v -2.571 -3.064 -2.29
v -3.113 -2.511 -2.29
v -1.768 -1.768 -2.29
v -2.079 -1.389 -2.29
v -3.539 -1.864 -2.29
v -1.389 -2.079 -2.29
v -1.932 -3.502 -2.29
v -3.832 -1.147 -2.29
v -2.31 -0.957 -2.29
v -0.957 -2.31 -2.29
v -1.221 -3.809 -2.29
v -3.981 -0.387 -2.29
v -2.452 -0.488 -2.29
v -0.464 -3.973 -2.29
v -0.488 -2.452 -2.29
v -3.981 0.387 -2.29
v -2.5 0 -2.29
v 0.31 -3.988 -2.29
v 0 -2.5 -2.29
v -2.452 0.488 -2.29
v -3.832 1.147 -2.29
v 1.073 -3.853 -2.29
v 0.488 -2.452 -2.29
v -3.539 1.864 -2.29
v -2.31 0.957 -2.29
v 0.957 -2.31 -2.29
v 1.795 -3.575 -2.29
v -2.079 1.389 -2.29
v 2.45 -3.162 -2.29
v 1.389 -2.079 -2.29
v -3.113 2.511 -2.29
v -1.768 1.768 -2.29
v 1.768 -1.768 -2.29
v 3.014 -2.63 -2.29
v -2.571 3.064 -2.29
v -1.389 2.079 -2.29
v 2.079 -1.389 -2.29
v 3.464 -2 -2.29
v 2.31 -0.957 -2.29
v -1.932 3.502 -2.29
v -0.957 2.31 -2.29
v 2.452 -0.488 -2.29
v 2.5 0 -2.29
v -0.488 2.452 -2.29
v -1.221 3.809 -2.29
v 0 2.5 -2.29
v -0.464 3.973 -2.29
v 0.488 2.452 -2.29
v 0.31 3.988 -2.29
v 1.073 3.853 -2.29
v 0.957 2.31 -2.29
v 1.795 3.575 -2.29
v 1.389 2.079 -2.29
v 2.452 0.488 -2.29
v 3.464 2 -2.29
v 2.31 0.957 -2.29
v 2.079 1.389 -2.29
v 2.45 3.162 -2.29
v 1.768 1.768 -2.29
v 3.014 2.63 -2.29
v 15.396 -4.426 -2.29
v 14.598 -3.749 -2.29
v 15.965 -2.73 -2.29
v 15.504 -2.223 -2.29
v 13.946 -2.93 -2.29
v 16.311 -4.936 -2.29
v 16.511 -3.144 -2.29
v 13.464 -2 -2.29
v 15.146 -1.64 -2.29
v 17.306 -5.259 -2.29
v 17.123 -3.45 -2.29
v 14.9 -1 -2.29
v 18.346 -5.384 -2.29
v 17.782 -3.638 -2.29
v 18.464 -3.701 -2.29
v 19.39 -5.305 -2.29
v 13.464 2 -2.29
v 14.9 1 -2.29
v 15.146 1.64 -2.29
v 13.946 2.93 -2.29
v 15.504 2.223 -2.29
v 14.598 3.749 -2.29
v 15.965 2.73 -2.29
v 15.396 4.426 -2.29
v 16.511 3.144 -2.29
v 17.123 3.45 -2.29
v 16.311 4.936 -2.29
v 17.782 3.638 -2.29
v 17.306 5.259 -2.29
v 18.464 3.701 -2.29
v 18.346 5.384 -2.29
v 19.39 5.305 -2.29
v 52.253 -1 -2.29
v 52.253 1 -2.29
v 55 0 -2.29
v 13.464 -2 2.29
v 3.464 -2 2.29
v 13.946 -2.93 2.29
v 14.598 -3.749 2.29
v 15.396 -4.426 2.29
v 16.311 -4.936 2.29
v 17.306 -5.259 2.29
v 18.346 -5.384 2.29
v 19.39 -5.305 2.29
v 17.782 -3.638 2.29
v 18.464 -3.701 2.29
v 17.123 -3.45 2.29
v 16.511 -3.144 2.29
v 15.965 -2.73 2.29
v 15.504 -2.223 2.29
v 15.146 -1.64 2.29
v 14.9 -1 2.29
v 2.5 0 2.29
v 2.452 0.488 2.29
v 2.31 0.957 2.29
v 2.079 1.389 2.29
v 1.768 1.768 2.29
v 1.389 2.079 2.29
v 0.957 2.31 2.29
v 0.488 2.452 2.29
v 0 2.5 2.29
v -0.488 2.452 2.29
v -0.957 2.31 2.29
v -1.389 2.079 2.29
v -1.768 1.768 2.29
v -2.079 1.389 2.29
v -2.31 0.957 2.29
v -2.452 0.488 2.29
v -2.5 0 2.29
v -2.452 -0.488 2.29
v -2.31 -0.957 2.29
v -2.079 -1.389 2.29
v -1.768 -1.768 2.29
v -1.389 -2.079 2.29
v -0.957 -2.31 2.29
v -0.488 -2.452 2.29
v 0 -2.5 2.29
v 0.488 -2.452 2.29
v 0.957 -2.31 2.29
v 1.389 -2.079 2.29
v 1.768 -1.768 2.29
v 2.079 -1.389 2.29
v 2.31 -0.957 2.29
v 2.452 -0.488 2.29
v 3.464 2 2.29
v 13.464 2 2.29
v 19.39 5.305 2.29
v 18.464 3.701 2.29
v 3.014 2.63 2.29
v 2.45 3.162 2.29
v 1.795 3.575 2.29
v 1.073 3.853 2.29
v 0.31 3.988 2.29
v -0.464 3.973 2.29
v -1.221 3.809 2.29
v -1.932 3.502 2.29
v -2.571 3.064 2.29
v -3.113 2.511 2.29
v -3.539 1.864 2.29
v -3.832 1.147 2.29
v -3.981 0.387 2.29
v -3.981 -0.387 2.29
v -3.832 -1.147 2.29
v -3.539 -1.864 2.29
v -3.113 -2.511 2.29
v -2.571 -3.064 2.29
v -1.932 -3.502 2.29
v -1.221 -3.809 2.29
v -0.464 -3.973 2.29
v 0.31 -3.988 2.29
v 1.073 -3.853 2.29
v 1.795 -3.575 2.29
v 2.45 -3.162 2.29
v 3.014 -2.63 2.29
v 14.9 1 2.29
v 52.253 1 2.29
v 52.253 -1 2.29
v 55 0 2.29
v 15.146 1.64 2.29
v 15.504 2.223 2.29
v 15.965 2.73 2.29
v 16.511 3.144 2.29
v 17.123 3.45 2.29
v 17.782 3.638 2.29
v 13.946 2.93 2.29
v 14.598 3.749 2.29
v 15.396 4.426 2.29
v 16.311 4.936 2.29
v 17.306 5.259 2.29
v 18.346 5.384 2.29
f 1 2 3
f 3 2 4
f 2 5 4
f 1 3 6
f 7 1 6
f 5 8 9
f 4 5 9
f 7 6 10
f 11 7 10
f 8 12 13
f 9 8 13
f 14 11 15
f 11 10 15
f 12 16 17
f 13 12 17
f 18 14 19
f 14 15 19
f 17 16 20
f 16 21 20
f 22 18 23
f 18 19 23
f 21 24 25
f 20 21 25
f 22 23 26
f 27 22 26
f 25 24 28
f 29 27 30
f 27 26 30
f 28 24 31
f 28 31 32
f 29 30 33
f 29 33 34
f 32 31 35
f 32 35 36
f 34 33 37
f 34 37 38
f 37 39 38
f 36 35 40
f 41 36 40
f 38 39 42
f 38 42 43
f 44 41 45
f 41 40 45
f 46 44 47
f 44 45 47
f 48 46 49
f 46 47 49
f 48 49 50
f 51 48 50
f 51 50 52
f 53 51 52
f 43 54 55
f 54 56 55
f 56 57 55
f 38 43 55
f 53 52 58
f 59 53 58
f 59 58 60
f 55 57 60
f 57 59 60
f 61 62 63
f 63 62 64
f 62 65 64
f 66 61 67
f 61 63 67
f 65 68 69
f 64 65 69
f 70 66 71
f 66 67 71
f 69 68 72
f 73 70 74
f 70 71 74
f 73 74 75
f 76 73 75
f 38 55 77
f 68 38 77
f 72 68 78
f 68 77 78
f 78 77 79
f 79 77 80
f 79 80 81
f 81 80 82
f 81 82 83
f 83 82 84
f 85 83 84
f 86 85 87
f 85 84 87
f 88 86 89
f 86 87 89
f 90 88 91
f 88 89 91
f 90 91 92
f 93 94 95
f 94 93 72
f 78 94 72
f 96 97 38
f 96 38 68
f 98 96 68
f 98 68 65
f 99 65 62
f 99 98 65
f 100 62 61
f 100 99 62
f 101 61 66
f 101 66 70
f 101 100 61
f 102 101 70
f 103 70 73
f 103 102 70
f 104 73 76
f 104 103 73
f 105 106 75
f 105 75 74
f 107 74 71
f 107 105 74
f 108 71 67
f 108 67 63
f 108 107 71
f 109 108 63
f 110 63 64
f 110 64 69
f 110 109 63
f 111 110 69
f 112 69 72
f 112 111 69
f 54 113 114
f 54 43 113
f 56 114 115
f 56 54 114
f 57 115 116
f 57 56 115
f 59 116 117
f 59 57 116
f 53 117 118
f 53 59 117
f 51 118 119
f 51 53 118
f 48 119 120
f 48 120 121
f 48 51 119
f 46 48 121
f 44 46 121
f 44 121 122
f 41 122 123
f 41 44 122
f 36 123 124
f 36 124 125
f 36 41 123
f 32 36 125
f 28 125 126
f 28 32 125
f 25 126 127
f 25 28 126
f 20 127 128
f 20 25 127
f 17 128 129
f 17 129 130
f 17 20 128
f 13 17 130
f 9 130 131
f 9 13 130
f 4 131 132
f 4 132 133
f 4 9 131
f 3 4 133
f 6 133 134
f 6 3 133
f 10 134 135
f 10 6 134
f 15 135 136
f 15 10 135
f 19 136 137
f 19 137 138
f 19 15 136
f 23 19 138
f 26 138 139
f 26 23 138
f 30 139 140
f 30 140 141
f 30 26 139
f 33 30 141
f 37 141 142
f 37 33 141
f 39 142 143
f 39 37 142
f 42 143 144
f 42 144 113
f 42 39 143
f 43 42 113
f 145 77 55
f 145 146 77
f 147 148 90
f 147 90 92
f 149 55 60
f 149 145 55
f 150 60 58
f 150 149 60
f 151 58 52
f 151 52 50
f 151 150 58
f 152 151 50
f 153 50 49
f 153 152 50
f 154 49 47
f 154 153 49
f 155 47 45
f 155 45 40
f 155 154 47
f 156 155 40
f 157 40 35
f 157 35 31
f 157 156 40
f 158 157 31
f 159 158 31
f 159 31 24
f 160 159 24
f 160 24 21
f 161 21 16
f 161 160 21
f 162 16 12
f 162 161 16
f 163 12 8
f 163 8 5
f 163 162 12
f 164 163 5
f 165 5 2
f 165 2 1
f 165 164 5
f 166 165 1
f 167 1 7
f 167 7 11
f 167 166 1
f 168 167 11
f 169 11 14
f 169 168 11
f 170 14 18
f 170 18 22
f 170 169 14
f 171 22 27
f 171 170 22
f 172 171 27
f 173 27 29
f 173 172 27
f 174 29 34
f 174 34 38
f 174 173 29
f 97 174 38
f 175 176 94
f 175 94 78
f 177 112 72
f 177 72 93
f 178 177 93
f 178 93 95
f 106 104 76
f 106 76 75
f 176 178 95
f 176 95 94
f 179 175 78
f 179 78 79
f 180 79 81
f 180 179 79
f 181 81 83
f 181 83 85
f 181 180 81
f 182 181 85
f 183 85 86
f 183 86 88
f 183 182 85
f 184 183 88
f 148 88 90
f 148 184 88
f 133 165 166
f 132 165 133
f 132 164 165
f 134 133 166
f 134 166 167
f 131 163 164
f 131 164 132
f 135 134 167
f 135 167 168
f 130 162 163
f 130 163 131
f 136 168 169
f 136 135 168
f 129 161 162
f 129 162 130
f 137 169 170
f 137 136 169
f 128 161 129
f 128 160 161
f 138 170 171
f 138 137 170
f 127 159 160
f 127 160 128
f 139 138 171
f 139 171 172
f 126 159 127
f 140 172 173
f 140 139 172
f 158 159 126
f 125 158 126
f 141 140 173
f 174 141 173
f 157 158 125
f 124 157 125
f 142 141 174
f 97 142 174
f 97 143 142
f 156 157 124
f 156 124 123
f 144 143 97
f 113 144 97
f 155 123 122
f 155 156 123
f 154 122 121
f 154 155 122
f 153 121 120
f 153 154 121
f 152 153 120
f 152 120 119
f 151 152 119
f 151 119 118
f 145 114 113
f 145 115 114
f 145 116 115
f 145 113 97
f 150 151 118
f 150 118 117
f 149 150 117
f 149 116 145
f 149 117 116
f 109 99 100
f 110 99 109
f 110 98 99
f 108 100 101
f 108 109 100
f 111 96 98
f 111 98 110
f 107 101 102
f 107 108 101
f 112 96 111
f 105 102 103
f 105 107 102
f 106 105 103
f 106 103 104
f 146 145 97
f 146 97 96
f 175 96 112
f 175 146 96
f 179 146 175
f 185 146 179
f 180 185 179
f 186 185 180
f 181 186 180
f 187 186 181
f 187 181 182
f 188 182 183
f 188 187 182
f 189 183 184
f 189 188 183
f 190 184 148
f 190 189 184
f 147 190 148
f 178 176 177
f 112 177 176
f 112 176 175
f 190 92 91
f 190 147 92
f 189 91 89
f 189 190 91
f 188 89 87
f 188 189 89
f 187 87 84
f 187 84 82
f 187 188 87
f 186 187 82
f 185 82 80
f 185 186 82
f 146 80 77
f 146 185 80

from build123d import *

# Parameters (mm, degrees)
F0_R     = 2.5
F1_DEPTH = 2.29


with BuildPart() as f1:
    # F0 (on Top) → F1 (new body, symmetric)
    with BuildSketch(Plane.XY):
        with BuildLine():
            Line((3.4641016151, -2), (3.4641016151, 0))
            Line((3.4641016151, 0), (3.4641016151, 2))
            ThreePointArc((3.4641016151, 2), (-4, 0), (3.4641016151, -2))
        make_face()
        Circle(F0_R, mode=Mode.SUBTRACT)
        with BuildLine():
            Line((4, 0), (3.4641016151, 0))
            Line((3.4641016151, 0), (3.4641016151, -2))
            ThreePointArc((3.4641016151, -2), (3.8637033052, -1.0352761804), (4, 0))
        make_face()
        with BuildLine():
            Line((3.4641016151, 2), (3.4641016151, 0))
            Line((3.4641016151, 0), (4, 0))
            ThreePointArc((4, 0), (3.8637033052, 1.0352761804), (3.4641016151, 2))
        make_face()
        with BuildLine():
            Line((13.4641016151, 0), (4, 0))
            ThreePointArc((4, 0), (3.8637033052, -1.0352761804), (3.4641016151, -2))
            Line((3.4641016151, -2), (13.4641016151, -2))
            Line((13.4641016151, -2), (13.4641016151, 0))
        make_face()
        with BuildLine():
            ThreePointArc((3.4641016151, 2), (3.8637033052, 1.0352761804), (4, 0))
            Line((4, 0), (13.4641016151, 0))
            Line((13.4641016151, 0), (13.4641016151, 2))
            Line((13.4641016151, 2), (3.4641016151, 2))
        make_face()
        Polygon((14.4215287229, 0), (13.4641016151, 0), (13.4641016151, -2), align=None)
        Polygon((13.4641016151, 2), (13.4641016151, 0), (14.4215287229, 0), align=None)
        Polygon((16.3363829384, 0), (14.4215287229, 0), (14.9002422768, -1), align=None)
        Polygon((14.9002422768, 1), (14.4215287229, 0), (16.3363829384, 0), align=None)
        Polygon((14.4215287229, 0), (13.4641016151, -2), (14.9002422768, -1), align=None)
        with BuildLine():
            Line((14.9002422768, -1), (13.4641016151, -2))
            ThreePointArc((13.4641016151, -2), (15.841018376, -4.7031302683), (19.3898786666, -5.3049916919))
            Line((19.3898786666, -5.3049916919), (18.4641016151, -3.7014988023))
            ThreePointArc((18.4641016151, -3.7014988023), (16.2280789653, -2.9497959409), (14.9002422768, -1))
        make_face()
        Polygon((16.3363829384, 0), (14.9002422768, -1), (52.2525225805, -1), (55, 0), align=None)
        Polygon((52.2525225805, 1), (14.9002422768, 1), (16.3363829384, 0), (55, 0), align=None)
        with BuildLine():
            ThreePointArc((19.3898786666, 5.3049916919), (15.841018376, 4.7031302683), (13.4641016151, 2))
            Line((13.4641016151, 2), (14.9002422768, 1))
            ThreePointArc((14.9002422768, 1), (16.2280789653, 2.9497959409), (18.4641016151, 3.7014988023))
            Line((18.4641016151, 3.7014988023), (19.3898786666, 5.3049916919))
        make_face()
        Polygon((14.9002422768, 1), (13.4641016151, 2), (14.4215287229, 0), align=None)
    extrude(amount=F1_DEPTH, both=True)


solid = f1.part
